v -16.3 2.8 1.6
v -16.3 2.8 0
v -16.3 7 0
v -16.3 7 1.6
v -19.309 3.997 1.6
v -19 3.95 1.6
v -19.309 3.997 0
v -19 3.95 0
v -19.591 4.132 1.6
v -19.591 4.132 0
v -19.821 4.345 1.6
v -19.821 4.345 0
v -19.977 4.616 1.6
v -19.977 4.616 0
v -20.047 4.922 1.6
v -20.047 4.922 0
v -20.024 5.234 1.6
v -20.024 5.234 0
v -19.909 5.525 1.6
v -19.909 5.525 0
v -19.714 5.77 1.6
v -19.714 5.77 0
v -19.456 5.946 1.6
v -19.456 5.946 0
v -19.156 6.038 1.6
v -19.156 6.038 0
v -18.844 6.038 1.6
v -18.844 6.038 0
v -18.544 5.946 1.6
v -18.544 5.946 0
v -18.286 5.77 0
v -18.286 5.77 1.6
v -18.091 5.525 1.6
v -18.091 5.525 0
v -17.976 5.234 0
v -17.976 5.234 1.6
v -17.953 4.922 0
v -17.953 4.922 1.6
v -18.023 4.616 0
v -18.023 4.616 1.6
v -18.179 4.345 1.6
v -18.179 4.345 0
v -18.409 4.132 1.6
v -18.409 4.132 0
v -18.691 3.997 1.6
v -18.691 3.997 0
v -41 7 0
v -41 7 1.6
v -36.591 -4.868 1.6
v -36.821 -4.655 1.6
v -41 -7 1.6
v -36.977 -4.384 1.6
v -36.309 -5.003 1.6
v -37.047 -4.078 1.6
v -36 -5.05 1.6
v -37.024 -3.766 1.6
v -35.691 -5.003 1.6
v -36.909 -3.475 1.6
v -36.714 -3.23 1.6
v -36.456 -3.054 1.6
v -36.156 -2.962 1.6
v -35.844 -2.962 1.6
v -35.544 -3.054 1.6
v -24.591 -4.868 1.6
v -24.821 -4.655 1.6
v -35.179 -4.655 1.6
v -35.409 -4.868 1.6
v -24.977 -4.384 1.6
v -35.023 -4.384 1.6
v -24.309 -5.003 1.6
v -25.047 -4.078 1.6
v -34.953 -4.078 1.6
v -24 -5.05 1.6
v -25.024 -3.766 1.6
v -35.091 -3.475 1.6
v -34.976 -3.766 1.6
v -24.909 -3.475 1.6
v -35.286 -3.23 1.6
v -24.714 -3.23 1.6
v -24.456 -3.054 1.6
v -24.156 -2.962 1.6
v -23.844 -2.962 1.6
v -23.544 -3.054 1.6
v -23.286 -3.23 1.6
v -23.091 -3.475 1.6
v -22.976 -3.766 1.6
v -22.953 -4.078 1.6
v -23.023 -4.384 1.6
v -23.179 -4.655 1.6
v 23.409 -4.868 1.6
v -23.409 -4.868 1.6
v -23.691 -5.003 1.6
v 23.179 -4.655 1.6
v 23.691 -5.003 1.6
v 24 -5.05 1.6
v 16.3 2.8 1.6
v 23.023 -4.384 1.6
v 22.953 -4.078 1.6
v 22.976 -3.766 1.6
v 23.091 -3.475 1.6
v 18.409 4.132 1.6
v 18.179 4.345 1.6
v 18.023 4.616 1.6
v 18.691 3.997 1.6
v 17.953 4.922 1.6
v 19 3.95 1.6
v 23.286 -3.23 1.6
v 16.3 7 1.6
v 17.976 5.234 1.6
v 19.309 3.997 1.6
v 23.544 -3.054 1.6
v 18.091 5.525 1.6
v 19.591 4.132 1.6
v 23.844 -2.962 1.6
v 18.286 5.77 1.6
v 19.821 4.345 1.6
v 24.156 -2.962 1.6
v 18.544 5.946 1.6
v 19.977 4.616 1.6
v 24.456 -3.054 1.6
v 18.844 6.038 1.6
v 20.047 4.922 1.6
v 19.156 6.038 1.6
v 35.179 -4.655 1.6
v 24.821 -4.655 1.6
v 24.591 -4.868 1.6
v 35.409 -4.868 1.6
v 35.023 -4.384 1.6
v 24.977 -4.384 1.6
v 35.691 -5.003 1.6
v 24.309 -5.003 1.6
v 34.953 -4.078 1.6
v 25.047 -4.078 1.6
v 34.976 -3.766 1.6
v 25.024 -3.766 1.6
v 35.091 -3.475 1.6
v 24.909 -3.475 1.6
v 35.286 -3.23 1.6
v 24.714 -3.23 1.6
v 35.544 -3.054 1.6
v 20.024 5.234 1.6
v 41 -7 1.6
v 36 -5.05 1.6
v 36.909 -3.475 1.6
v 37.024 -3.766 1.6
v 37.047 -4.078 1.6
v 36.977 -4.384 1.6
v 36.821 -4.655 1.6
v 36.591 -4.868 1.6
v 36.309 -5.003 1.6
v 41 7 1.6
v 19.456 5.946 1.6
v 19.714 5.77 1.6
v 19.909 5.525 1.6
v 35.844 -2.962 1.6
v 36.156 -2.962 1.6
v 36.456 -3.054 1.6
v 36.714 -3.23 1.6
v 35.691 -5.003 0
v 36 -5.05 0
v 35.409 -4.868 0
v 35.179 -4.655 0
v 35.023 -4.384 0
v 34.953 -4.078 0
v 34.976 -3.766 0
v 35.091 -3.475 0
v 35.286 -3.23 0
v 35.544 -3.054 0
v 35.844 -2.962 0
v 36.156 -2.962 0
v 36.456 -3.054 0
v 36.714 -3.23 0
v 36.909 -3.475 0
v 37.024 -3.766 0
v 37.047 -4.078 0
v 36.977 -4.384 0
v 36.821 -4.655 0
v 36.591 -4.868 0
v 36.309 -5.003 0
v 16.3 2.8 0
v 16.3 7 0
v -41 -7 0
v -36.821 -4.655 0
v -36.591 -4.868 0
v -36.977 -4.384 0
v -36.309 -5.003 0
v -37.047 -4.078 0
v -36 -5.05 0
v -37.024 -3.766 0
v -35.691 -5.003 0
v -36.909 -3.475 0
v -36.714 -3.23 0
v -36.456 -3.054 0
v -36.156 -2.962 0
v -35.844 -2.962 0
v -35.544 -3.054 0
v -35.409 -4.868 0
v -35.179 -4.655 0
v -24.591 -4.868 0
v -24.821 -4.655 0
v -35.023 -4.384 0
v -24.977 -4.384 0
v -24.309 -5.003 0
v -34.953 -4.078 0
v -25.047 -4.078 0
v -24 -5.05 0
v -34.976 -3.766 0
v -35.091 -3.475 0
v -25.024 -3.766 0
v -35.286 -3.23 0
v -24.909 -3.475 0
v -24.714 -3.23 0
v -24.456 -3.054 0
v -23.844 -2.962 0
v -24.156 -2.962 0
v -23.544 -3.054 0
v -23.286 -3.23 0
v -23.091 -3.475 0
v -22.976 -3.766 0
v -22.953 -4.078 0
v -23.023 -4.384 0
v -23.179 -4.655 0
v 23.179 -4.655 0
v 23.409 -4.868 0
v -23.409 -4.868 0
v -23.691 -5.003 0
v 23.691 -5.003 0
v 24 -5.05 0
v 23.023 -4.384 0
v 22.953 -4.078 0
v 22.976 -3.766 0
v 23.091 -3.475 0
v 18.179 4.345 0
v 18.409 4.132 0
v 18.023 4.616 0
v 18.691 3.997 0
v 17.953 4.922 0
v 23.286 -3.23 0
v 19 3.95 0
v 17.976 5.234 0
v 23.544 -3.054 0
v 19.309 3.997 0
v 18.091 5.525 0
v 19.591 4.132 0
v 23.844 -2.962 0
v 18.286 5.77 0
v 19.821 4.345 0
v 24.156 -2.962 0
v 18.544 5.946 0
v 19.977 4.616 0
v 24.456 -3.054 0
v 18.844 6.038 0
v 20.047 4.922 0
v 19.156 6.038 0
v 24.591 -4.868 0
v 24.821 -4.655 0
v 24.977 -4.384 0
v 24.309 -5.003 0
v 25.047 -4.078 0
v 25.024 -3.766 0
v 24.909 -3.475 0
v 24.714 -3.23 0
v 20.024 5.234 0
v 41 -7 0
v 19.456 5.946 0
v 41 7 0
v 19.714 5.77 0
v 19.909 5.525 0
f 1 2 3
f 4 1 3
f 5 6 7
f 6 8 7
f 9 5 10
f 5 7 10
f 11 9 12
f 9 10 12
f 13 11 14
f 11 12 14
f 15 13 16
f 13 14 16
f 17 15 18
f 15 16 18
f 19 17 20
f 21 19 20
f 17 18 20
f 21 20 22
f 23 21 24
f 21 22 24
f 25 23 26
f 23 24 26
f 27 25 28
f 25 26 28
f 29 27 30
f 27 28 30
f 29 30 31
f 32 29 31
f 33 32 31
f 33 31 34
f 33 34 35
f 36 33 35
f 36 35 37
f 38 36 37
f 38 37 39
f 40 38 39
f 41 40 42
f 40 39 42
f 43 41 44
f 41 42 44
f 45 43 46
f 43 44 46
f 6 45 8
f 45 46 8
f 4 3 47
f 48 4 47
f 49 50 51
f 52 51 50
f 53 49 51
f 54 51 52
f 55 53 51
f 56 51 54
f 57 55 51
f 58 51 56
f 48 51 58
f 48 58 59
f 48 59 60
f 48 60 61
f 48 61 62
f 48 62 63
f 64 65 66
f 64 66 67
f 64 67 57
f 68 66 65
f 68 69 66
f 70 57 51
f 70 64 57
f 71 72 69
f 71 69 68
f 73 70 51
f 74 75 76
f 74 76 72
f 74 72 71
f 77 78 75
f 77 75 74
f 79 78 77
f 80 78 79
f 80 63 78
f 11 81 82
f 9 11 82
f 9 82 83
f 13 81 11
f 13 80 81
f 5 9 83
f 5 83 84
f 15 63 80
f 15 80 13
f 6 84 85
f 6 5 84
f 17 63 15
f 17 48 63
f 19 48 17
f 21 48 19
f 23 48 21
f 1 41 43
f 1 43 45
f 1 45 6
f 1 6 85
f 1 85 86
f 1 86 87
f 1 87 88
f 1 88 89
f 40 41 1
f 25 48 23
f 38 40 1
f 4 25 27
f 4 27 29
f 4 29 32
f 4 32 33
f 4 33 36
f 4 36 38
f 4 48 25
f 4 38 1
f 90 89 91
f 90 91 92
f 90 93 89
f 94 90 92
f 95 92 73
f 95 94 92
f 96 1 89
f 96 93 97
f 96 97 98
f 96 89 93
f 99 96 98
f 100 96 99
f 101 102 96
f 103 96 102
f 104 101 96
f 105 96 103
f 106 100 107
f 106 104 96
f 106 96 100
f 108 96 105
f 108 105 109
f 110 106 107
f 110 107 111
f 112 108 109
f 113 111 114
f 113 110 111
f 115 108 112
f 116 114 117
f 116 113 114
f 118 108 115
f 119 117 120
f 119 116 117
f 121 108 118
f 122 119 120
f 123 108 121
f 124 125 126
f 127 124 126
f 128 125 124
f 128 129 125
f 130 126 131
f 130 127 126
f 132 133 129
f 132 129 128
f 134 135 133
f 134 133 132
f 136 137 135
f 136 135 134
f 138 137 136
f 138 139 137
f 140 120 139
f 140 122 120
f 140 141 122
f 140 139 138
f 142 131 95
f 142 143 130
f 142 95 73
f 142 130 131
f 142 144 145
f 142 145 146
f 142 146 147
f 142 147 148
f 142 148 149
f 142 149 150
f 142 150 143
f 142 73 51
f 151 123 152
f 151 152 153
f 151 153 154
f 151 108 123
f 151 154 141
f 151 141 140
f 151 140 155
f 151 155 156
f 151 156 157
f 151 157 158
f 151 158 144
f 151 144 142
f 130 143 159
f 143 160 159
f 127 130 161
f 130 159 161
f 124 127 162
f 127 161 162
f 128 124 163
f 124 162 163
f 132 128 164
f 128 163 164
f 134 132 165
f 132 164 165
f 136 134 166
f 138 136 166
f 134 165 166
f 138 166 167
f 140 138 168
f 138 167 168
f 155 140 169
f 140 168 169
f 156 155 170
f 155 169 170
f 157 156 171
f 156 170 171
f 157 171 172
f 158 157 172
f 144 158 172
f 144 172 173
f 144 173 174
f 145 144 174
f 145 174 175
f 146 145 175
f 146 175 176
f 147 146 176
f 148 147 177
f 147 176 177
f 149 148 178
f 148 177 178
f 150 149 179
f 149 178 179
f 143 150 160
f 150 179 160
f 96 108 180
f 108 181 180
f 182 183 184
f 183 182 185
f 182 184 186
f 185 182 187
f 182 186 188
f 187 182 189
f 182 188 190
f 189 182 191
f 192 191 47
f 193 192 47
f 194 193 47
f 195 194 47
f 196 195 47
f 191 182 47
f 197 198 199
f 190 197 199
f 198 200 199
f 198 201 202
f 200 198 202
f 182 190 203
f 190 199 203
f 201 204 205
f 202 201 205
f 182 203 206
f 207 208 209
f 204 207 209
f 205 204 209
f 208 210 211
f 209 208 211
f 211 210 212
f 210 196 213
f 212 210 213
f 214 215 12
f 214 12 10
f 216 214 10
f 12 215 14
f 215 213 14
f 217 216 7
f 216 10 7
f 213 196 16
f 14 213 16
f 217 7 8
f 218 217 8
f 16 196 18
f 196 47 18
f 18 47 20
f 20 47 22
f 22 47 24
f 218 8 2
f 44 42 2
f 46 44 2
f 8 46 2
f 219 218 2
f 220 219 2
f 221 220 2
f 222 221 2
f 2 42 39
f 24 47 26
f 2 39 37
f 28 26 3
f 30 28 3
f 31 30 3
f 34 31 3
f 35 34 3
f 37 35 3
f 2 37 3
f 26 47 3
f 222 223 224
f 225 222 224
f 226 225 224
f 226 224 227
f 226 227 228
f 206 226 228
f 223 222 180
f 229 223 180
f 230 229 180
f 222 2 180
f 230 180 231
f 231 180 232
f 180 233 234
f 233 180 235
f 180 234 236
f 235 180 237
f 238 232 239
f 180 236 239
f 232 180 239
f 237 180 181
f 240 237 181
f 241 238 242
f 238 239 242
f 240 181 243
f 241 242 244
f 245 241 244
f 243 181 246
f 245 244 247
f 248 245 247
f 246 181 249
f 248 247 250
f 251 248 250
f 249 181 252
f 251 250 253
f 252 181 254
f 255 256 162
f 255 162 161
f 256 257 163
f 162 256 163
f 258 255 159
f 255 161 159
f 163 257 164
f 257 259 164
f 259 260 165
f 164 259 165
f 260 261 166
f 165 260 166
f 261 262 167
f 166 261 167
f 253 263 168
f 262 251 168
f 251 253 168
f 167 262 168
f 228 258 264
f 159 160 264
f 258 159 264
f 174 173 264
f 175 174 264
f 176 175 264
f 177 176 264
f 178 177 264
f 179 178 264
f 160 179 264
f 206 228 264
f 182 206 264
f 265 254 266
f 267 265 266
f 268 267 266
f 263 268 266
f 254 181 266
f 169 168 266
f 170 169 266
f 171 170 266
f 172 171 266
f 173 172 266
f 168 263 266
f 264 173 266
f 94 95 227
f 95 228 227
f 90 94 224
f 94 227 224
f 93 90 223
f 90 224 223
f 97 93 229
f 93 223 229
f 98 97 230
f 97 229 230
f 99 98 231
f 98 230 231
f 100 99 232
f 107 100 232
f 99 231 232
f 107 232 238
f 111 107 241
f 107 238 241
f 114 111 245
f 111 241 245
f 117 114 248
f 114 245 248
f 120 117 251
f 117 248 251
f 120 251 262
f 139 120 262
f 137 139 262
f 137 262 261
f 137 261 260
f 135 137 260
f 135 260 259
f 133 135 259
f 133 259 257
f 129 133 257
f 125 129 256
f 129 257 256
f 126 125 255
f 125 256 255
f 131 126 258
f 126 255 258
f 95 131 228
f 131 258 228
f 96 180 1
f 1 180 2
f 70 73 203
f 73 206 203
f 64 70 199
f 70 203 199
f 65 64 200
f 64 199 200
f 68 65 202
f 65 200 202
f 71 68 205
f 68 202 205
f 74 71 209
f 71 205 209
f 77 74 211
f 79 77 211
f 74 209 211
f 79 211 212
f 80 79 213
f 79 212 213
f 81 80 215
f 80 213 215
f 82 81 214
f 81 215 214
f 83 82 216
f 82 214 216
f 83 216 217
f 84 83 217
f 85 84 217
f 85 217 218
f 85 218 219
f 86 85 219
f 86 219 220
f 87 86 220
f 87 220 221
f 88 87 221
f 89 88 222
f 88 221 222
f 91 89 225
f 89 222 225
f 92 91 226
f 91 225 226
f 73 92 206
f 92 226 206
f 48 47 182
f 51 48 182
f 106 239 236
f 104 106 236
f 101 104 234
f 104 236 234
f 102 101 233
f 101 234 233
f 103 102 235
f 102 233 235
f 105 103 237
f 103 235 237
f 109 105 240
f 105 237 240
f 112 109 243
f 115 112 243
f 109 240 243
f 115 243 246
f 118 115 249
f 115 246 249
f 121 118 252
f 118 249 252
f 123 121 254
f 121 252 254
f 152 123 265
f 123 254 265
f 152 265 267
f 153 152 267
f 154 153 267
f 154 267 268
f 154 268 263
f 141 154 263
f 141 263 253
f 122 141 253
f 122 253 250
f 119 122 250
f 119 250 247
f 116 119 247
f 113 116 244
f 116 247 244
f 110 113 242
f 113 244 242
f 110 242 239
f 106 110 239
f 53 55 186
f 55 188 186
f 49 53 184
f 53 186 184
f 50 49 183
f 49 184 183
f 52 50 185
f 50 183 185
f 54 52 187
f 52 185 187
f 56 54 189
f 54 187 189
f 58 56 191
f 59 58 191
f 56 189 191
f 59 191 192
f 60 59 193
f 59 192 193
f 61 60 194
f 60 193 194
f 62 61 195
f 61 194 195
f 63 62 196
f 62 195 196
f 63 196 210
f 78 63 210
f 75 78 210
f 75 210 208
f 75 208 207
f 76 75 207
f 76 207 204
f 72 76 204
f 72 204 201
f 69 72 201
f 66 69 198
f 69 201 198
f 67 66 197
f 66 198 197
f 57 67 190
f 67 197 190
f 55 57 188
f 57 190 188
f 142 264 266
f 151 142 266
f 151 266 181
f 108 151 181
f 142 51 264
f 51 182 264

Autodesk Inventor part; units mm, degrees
ref_plane "YZ Plane" through (0, 0, 0) normal (1, 0, 0) x (0, 1, 0)
ref_plane "XZ Plane" through (0, 0, 0) normal (0, 1, 0) x (-1, 0, 0)
ref_plane "XY Plane" through (0, 0, 0) normal (0, 0, 1) x (1, 0, 0)
sketch "Skizze1" plane through (0, 0, 0) normal (0, 0, 1) x (1, 0, 0)
  line L0 (-41, -7) -> (41, -7)
  line L1 (41, -7) -> (41, 7)
  line L2 (-41, 7) -> (-41, -7)
  line L3 (-41, -7) -> (41, 7) construction
  line L4 (41, -7) -> (-41, 7) construction
  line L5 (16.3, 7) -> (16.3, 2.8)
  line L6 (16.3, 2.8) -> (-16.3, 2.8)
  line L7 (-16.3, 2.8) -> (-16.3, 7)
  line L8 (41, 7) -> (16.3, 7)
  line L9 (-16.3, 7) -> (-41, 7)
  line L10 (0, 9.8) -> (0, -9.8) projected
  point P0 (0, 0)
  dimension "d0" = 82
  dimension "d1" = 14
  dimension "d13" = 4.2
  dimension "d14" = 32.6
extrude "Extrusion1" add sketch "Skizze1" along normal blind 1.6
sketch "Skizze2" plane through (0, 0, 1.6) normal (0, 0, 1) x (1, 0, 0)
  line L0 (0, 9.8) -> (0, -9.8) projected
  line L1 (-57.4, 0) -> (57.4, 0) projected
  line L2 (-19, 5) -> (19, 5) construction
  line L3 (-16.3, 7) -> (-41, 7) projected
  point P0 (0, 0)
  dimension "d4" = 38
  dimension "d15" = 2
hole "Bohrung1" at (-19, 5, 1.6) at (19, 5, 1.6) direction (0, 0, -1) diameter 2.1 end through all
sketch "Skizze3" plane through (0, 0, 1.6) normal (0, 0, 1) x (1, 0, 0)
  line L0 (-41, -7) -> (41, -7) projected
  line L1 (0, 9.8) -> (0, -9.8) projected
  line L2 (-36, -4) -> (-24, -4) construction
  line L3 (24, -4) -> (36, -4) construction
  point P0 (0, 0)
  dimension "d16" = 3
  dimension "d17" = 24
  dimension "d18" = 12
hole "Bohrung2" at (-36, -4, 1.6) at (-24, -4, 1.6) at (24, -4, 1.6) at (36, -4, 1.6) direction (0, 0, -1) diameter 2.1 end through all
properties part number "Eyeboard" material "Phenolharz"
